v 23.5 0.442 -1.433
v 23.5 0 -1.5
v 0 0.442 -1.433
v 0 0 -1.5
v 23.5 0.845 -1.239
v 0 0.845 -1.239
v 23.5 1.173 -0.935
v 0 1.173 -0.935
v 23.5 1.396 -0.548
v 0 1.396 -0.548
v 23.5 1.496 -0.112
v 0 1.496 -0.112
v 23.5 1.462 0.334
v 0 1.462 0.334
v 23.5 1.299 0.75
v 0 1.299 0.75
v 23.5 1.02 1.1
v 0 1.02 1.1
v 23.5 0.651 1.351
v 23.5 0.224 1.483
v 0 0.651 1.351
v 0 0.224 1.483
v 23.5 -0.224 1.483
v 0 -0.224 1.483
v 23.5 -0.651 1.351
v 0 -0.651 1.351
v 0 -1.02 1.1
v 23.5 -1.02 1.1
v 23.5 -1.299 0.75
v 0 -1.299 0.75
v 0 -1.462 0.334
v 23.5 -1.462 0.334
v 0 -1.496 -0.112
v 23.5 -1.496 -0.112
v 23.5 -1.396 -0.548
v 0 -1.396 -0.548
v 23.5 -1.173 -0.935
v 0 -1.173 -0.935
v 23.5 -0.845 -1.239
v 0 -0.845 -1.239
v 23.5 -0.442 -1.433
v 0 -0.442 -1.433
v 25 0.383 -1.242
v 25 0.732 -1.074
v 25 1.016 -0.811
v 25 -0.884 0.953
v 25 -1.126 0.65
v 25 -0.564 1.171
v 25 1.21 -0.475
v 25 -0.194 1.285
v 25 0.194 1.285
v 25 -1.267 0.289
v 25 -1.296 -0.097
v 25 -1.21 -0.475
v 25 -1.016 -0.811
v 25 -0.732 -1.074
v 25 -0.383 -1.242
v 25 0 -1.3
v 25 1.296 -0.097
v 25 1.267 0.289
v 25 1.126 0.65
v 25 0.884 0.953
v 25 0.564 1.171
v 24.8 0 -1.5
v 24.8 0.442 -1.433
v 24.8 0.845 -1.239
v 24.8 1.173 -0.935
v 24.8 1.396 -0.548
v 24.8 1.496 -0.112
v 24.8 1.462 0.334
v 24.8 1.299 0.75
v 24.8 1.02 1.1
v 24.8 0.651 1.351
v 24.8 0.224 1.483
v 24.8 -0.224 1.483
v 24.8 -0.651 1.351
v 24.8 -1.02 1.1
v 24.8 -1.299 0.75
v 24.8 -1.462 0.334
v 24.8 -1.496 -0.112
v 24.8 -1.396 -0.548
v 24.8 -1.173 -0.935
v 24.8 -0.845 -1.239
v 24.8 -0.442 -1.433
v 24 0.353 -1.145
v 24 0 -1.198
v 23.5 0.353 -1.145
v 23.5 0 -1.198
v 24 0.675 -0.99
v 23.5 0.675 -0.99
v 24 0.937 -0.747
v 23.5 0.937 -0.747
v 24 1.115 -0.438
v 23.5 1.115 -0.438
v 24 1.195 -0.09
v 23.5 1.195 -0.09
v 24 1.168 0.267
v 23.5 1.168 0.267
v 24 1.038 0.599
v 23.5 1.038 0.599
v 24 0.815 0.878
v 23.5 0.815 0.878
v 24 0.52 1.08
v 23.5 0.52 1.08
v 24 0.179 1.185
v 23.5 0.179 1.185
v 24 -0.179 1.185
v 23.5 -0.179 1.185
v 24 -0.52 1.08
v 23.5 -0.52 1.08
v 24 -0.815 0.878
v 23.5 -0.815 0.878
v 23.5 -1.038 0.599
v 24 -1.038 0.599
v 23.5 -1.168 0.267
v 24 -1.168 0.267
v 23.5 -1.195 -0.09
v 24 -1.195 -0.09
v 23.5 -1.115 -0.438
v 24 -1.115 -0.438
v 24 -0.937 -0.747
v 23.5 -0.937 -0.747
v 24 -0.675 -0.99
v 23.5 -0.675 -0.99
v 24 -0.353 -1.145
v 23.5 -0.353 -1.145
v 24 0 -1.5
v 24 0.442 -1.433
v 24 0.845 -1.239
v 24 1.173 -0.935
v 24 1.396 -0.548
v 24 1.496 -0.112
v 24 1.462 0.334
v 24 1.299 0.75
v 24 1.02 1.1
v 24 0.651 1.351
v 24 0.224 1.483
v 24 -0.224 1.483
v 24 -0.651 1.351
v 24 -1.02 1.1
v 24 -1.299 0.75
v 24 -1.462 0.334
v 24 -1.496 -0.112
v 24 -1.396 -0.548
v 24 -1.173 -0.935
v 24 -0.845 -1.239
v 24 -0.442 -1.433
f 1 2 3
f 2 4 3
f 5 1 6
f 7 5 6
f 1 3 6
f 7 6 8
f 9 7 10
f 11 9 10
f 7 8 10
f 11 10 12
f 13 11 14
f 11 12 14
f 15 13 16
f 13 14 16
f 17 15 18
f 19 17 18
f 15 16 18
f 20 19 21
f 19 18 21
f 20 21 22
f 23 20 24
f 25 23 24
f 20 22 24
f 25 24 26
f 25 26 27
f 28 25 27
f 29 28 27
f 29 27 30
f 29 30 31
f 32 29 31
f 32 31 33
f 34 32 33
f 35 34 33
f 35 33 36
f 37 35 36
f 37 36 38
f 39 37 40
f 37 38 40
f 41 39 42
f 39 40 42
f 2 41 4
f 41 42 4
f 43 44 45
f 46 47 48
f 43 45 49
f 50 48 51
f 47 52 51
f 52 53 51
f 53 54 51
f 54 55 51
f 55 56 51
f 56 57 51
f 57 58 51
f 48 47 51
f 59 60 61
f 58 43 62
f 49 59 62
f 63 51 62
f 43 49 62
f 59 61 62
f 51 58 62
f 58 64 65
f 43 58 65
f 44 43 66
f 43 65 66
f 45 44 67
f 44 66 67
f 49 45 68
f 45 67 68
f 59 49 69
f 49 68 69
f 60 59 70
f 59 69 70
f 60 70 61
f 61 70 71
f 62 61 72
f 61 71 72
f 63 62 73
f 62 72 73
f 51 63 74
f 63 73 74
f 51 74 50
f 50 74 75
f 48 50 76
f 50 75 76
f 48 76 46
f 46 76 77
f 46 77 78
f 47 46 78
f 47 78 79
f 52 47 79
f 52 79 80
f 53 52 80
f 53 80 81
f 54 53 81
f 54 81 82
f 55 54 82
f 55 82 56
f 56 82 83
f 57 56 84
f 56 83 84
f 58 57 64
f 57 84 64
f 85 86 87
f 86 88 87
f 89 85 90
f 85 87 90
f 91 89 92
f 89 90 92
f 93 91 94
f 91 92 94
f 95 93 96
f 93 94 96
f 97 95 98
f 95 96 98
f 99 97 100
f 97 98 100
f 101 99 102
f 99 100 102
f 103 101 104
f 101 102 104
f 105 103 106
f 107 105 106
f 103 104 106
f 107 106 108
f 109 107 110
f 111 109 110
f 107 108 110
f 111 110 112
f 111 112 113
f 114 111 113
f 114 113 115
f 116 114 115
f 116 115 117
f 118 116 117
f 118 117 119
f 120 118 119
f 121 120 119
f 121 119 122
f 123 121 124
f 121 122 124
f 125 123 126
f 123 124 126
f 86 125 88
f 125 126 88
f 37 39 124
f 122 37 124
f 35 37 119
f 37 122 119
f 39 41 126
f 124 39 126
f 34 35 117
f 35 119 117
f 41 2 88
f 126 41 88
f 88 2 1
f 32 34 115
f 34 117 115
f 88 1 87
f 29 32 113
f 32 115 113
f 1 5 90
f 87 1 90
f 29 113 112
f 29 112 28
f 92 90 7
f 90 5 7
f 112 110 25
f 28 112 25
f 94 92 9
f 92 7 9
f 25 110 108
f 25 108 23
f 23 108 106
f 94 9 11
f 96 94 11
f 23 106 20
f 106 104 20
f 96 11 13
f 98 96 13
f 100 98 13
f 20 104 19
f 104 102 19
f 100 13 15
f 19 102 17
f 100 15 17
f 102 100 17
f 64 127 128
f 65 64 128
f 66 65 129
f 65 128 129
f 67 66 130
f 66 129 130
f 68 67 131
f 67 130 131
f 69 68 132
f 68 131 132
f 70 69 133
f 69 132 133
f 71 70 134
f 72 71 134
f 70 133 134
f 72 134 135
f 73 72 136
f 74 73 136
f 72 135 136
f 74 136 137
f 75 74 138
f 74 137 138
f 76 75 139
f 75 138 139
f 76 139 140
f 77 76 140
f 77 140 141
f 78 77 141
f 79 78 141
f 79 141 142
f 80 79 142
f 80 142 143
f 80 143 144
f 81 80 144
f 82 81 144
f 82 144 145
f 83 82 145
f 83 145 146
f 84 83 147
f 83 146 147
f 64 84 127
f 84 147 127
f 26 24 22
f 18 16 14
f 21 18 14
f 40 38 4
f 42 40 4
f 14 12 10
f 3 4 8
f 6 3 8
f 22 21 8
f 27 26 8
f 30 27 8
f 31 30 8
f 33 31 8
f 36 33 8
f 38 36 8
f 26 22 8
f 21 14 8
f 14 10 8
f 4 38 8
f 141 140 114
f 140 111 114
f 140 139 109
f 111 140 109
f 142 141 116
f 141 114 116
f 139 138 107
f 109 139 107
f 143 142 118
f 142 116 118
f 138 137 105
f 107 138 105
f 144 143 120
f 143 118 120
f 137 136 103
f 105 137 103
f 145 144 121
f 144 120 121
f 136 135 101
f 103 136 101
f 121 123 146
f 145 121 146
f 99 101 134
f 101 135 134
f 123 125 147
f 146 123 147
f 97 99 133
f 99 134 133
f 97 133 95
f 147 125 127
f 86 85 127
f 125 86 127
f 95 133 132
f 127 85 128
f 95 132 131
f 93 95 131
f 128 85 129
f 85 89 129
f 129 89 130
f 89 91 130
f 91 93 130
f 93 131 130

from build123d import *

# Parameters (mm, degrees)
CHAFL_N1_SIZE = 0.2


with BuildPart() as part:
    # Croquis1 → Revolución1 (revolve)
    with BuildSketch(Plane(origin=(0, 0, 0), x_dir=(1, 0, 0), z_dir=(0, 1, 0))):
        Polygon((0, 0), (25, 0), (25, 1.5), (24, 1.5), (24, 1.198324022), (23.5, 1.198324022), (23.5, 1.5), (0, 1.5), align=None)
    revolve(axis=Axis((0, 0, 0), (1, 0, 0)))

    # Chaflán1
    chafl_n1_edges = [part.edges().sort_by_distance(p)[0] for p in [
        (25, 0, 1.5),
    ]]
    chamfer(chafl_n1_edges, length=CHAFL_N1_SIZE)


solid = part.part
